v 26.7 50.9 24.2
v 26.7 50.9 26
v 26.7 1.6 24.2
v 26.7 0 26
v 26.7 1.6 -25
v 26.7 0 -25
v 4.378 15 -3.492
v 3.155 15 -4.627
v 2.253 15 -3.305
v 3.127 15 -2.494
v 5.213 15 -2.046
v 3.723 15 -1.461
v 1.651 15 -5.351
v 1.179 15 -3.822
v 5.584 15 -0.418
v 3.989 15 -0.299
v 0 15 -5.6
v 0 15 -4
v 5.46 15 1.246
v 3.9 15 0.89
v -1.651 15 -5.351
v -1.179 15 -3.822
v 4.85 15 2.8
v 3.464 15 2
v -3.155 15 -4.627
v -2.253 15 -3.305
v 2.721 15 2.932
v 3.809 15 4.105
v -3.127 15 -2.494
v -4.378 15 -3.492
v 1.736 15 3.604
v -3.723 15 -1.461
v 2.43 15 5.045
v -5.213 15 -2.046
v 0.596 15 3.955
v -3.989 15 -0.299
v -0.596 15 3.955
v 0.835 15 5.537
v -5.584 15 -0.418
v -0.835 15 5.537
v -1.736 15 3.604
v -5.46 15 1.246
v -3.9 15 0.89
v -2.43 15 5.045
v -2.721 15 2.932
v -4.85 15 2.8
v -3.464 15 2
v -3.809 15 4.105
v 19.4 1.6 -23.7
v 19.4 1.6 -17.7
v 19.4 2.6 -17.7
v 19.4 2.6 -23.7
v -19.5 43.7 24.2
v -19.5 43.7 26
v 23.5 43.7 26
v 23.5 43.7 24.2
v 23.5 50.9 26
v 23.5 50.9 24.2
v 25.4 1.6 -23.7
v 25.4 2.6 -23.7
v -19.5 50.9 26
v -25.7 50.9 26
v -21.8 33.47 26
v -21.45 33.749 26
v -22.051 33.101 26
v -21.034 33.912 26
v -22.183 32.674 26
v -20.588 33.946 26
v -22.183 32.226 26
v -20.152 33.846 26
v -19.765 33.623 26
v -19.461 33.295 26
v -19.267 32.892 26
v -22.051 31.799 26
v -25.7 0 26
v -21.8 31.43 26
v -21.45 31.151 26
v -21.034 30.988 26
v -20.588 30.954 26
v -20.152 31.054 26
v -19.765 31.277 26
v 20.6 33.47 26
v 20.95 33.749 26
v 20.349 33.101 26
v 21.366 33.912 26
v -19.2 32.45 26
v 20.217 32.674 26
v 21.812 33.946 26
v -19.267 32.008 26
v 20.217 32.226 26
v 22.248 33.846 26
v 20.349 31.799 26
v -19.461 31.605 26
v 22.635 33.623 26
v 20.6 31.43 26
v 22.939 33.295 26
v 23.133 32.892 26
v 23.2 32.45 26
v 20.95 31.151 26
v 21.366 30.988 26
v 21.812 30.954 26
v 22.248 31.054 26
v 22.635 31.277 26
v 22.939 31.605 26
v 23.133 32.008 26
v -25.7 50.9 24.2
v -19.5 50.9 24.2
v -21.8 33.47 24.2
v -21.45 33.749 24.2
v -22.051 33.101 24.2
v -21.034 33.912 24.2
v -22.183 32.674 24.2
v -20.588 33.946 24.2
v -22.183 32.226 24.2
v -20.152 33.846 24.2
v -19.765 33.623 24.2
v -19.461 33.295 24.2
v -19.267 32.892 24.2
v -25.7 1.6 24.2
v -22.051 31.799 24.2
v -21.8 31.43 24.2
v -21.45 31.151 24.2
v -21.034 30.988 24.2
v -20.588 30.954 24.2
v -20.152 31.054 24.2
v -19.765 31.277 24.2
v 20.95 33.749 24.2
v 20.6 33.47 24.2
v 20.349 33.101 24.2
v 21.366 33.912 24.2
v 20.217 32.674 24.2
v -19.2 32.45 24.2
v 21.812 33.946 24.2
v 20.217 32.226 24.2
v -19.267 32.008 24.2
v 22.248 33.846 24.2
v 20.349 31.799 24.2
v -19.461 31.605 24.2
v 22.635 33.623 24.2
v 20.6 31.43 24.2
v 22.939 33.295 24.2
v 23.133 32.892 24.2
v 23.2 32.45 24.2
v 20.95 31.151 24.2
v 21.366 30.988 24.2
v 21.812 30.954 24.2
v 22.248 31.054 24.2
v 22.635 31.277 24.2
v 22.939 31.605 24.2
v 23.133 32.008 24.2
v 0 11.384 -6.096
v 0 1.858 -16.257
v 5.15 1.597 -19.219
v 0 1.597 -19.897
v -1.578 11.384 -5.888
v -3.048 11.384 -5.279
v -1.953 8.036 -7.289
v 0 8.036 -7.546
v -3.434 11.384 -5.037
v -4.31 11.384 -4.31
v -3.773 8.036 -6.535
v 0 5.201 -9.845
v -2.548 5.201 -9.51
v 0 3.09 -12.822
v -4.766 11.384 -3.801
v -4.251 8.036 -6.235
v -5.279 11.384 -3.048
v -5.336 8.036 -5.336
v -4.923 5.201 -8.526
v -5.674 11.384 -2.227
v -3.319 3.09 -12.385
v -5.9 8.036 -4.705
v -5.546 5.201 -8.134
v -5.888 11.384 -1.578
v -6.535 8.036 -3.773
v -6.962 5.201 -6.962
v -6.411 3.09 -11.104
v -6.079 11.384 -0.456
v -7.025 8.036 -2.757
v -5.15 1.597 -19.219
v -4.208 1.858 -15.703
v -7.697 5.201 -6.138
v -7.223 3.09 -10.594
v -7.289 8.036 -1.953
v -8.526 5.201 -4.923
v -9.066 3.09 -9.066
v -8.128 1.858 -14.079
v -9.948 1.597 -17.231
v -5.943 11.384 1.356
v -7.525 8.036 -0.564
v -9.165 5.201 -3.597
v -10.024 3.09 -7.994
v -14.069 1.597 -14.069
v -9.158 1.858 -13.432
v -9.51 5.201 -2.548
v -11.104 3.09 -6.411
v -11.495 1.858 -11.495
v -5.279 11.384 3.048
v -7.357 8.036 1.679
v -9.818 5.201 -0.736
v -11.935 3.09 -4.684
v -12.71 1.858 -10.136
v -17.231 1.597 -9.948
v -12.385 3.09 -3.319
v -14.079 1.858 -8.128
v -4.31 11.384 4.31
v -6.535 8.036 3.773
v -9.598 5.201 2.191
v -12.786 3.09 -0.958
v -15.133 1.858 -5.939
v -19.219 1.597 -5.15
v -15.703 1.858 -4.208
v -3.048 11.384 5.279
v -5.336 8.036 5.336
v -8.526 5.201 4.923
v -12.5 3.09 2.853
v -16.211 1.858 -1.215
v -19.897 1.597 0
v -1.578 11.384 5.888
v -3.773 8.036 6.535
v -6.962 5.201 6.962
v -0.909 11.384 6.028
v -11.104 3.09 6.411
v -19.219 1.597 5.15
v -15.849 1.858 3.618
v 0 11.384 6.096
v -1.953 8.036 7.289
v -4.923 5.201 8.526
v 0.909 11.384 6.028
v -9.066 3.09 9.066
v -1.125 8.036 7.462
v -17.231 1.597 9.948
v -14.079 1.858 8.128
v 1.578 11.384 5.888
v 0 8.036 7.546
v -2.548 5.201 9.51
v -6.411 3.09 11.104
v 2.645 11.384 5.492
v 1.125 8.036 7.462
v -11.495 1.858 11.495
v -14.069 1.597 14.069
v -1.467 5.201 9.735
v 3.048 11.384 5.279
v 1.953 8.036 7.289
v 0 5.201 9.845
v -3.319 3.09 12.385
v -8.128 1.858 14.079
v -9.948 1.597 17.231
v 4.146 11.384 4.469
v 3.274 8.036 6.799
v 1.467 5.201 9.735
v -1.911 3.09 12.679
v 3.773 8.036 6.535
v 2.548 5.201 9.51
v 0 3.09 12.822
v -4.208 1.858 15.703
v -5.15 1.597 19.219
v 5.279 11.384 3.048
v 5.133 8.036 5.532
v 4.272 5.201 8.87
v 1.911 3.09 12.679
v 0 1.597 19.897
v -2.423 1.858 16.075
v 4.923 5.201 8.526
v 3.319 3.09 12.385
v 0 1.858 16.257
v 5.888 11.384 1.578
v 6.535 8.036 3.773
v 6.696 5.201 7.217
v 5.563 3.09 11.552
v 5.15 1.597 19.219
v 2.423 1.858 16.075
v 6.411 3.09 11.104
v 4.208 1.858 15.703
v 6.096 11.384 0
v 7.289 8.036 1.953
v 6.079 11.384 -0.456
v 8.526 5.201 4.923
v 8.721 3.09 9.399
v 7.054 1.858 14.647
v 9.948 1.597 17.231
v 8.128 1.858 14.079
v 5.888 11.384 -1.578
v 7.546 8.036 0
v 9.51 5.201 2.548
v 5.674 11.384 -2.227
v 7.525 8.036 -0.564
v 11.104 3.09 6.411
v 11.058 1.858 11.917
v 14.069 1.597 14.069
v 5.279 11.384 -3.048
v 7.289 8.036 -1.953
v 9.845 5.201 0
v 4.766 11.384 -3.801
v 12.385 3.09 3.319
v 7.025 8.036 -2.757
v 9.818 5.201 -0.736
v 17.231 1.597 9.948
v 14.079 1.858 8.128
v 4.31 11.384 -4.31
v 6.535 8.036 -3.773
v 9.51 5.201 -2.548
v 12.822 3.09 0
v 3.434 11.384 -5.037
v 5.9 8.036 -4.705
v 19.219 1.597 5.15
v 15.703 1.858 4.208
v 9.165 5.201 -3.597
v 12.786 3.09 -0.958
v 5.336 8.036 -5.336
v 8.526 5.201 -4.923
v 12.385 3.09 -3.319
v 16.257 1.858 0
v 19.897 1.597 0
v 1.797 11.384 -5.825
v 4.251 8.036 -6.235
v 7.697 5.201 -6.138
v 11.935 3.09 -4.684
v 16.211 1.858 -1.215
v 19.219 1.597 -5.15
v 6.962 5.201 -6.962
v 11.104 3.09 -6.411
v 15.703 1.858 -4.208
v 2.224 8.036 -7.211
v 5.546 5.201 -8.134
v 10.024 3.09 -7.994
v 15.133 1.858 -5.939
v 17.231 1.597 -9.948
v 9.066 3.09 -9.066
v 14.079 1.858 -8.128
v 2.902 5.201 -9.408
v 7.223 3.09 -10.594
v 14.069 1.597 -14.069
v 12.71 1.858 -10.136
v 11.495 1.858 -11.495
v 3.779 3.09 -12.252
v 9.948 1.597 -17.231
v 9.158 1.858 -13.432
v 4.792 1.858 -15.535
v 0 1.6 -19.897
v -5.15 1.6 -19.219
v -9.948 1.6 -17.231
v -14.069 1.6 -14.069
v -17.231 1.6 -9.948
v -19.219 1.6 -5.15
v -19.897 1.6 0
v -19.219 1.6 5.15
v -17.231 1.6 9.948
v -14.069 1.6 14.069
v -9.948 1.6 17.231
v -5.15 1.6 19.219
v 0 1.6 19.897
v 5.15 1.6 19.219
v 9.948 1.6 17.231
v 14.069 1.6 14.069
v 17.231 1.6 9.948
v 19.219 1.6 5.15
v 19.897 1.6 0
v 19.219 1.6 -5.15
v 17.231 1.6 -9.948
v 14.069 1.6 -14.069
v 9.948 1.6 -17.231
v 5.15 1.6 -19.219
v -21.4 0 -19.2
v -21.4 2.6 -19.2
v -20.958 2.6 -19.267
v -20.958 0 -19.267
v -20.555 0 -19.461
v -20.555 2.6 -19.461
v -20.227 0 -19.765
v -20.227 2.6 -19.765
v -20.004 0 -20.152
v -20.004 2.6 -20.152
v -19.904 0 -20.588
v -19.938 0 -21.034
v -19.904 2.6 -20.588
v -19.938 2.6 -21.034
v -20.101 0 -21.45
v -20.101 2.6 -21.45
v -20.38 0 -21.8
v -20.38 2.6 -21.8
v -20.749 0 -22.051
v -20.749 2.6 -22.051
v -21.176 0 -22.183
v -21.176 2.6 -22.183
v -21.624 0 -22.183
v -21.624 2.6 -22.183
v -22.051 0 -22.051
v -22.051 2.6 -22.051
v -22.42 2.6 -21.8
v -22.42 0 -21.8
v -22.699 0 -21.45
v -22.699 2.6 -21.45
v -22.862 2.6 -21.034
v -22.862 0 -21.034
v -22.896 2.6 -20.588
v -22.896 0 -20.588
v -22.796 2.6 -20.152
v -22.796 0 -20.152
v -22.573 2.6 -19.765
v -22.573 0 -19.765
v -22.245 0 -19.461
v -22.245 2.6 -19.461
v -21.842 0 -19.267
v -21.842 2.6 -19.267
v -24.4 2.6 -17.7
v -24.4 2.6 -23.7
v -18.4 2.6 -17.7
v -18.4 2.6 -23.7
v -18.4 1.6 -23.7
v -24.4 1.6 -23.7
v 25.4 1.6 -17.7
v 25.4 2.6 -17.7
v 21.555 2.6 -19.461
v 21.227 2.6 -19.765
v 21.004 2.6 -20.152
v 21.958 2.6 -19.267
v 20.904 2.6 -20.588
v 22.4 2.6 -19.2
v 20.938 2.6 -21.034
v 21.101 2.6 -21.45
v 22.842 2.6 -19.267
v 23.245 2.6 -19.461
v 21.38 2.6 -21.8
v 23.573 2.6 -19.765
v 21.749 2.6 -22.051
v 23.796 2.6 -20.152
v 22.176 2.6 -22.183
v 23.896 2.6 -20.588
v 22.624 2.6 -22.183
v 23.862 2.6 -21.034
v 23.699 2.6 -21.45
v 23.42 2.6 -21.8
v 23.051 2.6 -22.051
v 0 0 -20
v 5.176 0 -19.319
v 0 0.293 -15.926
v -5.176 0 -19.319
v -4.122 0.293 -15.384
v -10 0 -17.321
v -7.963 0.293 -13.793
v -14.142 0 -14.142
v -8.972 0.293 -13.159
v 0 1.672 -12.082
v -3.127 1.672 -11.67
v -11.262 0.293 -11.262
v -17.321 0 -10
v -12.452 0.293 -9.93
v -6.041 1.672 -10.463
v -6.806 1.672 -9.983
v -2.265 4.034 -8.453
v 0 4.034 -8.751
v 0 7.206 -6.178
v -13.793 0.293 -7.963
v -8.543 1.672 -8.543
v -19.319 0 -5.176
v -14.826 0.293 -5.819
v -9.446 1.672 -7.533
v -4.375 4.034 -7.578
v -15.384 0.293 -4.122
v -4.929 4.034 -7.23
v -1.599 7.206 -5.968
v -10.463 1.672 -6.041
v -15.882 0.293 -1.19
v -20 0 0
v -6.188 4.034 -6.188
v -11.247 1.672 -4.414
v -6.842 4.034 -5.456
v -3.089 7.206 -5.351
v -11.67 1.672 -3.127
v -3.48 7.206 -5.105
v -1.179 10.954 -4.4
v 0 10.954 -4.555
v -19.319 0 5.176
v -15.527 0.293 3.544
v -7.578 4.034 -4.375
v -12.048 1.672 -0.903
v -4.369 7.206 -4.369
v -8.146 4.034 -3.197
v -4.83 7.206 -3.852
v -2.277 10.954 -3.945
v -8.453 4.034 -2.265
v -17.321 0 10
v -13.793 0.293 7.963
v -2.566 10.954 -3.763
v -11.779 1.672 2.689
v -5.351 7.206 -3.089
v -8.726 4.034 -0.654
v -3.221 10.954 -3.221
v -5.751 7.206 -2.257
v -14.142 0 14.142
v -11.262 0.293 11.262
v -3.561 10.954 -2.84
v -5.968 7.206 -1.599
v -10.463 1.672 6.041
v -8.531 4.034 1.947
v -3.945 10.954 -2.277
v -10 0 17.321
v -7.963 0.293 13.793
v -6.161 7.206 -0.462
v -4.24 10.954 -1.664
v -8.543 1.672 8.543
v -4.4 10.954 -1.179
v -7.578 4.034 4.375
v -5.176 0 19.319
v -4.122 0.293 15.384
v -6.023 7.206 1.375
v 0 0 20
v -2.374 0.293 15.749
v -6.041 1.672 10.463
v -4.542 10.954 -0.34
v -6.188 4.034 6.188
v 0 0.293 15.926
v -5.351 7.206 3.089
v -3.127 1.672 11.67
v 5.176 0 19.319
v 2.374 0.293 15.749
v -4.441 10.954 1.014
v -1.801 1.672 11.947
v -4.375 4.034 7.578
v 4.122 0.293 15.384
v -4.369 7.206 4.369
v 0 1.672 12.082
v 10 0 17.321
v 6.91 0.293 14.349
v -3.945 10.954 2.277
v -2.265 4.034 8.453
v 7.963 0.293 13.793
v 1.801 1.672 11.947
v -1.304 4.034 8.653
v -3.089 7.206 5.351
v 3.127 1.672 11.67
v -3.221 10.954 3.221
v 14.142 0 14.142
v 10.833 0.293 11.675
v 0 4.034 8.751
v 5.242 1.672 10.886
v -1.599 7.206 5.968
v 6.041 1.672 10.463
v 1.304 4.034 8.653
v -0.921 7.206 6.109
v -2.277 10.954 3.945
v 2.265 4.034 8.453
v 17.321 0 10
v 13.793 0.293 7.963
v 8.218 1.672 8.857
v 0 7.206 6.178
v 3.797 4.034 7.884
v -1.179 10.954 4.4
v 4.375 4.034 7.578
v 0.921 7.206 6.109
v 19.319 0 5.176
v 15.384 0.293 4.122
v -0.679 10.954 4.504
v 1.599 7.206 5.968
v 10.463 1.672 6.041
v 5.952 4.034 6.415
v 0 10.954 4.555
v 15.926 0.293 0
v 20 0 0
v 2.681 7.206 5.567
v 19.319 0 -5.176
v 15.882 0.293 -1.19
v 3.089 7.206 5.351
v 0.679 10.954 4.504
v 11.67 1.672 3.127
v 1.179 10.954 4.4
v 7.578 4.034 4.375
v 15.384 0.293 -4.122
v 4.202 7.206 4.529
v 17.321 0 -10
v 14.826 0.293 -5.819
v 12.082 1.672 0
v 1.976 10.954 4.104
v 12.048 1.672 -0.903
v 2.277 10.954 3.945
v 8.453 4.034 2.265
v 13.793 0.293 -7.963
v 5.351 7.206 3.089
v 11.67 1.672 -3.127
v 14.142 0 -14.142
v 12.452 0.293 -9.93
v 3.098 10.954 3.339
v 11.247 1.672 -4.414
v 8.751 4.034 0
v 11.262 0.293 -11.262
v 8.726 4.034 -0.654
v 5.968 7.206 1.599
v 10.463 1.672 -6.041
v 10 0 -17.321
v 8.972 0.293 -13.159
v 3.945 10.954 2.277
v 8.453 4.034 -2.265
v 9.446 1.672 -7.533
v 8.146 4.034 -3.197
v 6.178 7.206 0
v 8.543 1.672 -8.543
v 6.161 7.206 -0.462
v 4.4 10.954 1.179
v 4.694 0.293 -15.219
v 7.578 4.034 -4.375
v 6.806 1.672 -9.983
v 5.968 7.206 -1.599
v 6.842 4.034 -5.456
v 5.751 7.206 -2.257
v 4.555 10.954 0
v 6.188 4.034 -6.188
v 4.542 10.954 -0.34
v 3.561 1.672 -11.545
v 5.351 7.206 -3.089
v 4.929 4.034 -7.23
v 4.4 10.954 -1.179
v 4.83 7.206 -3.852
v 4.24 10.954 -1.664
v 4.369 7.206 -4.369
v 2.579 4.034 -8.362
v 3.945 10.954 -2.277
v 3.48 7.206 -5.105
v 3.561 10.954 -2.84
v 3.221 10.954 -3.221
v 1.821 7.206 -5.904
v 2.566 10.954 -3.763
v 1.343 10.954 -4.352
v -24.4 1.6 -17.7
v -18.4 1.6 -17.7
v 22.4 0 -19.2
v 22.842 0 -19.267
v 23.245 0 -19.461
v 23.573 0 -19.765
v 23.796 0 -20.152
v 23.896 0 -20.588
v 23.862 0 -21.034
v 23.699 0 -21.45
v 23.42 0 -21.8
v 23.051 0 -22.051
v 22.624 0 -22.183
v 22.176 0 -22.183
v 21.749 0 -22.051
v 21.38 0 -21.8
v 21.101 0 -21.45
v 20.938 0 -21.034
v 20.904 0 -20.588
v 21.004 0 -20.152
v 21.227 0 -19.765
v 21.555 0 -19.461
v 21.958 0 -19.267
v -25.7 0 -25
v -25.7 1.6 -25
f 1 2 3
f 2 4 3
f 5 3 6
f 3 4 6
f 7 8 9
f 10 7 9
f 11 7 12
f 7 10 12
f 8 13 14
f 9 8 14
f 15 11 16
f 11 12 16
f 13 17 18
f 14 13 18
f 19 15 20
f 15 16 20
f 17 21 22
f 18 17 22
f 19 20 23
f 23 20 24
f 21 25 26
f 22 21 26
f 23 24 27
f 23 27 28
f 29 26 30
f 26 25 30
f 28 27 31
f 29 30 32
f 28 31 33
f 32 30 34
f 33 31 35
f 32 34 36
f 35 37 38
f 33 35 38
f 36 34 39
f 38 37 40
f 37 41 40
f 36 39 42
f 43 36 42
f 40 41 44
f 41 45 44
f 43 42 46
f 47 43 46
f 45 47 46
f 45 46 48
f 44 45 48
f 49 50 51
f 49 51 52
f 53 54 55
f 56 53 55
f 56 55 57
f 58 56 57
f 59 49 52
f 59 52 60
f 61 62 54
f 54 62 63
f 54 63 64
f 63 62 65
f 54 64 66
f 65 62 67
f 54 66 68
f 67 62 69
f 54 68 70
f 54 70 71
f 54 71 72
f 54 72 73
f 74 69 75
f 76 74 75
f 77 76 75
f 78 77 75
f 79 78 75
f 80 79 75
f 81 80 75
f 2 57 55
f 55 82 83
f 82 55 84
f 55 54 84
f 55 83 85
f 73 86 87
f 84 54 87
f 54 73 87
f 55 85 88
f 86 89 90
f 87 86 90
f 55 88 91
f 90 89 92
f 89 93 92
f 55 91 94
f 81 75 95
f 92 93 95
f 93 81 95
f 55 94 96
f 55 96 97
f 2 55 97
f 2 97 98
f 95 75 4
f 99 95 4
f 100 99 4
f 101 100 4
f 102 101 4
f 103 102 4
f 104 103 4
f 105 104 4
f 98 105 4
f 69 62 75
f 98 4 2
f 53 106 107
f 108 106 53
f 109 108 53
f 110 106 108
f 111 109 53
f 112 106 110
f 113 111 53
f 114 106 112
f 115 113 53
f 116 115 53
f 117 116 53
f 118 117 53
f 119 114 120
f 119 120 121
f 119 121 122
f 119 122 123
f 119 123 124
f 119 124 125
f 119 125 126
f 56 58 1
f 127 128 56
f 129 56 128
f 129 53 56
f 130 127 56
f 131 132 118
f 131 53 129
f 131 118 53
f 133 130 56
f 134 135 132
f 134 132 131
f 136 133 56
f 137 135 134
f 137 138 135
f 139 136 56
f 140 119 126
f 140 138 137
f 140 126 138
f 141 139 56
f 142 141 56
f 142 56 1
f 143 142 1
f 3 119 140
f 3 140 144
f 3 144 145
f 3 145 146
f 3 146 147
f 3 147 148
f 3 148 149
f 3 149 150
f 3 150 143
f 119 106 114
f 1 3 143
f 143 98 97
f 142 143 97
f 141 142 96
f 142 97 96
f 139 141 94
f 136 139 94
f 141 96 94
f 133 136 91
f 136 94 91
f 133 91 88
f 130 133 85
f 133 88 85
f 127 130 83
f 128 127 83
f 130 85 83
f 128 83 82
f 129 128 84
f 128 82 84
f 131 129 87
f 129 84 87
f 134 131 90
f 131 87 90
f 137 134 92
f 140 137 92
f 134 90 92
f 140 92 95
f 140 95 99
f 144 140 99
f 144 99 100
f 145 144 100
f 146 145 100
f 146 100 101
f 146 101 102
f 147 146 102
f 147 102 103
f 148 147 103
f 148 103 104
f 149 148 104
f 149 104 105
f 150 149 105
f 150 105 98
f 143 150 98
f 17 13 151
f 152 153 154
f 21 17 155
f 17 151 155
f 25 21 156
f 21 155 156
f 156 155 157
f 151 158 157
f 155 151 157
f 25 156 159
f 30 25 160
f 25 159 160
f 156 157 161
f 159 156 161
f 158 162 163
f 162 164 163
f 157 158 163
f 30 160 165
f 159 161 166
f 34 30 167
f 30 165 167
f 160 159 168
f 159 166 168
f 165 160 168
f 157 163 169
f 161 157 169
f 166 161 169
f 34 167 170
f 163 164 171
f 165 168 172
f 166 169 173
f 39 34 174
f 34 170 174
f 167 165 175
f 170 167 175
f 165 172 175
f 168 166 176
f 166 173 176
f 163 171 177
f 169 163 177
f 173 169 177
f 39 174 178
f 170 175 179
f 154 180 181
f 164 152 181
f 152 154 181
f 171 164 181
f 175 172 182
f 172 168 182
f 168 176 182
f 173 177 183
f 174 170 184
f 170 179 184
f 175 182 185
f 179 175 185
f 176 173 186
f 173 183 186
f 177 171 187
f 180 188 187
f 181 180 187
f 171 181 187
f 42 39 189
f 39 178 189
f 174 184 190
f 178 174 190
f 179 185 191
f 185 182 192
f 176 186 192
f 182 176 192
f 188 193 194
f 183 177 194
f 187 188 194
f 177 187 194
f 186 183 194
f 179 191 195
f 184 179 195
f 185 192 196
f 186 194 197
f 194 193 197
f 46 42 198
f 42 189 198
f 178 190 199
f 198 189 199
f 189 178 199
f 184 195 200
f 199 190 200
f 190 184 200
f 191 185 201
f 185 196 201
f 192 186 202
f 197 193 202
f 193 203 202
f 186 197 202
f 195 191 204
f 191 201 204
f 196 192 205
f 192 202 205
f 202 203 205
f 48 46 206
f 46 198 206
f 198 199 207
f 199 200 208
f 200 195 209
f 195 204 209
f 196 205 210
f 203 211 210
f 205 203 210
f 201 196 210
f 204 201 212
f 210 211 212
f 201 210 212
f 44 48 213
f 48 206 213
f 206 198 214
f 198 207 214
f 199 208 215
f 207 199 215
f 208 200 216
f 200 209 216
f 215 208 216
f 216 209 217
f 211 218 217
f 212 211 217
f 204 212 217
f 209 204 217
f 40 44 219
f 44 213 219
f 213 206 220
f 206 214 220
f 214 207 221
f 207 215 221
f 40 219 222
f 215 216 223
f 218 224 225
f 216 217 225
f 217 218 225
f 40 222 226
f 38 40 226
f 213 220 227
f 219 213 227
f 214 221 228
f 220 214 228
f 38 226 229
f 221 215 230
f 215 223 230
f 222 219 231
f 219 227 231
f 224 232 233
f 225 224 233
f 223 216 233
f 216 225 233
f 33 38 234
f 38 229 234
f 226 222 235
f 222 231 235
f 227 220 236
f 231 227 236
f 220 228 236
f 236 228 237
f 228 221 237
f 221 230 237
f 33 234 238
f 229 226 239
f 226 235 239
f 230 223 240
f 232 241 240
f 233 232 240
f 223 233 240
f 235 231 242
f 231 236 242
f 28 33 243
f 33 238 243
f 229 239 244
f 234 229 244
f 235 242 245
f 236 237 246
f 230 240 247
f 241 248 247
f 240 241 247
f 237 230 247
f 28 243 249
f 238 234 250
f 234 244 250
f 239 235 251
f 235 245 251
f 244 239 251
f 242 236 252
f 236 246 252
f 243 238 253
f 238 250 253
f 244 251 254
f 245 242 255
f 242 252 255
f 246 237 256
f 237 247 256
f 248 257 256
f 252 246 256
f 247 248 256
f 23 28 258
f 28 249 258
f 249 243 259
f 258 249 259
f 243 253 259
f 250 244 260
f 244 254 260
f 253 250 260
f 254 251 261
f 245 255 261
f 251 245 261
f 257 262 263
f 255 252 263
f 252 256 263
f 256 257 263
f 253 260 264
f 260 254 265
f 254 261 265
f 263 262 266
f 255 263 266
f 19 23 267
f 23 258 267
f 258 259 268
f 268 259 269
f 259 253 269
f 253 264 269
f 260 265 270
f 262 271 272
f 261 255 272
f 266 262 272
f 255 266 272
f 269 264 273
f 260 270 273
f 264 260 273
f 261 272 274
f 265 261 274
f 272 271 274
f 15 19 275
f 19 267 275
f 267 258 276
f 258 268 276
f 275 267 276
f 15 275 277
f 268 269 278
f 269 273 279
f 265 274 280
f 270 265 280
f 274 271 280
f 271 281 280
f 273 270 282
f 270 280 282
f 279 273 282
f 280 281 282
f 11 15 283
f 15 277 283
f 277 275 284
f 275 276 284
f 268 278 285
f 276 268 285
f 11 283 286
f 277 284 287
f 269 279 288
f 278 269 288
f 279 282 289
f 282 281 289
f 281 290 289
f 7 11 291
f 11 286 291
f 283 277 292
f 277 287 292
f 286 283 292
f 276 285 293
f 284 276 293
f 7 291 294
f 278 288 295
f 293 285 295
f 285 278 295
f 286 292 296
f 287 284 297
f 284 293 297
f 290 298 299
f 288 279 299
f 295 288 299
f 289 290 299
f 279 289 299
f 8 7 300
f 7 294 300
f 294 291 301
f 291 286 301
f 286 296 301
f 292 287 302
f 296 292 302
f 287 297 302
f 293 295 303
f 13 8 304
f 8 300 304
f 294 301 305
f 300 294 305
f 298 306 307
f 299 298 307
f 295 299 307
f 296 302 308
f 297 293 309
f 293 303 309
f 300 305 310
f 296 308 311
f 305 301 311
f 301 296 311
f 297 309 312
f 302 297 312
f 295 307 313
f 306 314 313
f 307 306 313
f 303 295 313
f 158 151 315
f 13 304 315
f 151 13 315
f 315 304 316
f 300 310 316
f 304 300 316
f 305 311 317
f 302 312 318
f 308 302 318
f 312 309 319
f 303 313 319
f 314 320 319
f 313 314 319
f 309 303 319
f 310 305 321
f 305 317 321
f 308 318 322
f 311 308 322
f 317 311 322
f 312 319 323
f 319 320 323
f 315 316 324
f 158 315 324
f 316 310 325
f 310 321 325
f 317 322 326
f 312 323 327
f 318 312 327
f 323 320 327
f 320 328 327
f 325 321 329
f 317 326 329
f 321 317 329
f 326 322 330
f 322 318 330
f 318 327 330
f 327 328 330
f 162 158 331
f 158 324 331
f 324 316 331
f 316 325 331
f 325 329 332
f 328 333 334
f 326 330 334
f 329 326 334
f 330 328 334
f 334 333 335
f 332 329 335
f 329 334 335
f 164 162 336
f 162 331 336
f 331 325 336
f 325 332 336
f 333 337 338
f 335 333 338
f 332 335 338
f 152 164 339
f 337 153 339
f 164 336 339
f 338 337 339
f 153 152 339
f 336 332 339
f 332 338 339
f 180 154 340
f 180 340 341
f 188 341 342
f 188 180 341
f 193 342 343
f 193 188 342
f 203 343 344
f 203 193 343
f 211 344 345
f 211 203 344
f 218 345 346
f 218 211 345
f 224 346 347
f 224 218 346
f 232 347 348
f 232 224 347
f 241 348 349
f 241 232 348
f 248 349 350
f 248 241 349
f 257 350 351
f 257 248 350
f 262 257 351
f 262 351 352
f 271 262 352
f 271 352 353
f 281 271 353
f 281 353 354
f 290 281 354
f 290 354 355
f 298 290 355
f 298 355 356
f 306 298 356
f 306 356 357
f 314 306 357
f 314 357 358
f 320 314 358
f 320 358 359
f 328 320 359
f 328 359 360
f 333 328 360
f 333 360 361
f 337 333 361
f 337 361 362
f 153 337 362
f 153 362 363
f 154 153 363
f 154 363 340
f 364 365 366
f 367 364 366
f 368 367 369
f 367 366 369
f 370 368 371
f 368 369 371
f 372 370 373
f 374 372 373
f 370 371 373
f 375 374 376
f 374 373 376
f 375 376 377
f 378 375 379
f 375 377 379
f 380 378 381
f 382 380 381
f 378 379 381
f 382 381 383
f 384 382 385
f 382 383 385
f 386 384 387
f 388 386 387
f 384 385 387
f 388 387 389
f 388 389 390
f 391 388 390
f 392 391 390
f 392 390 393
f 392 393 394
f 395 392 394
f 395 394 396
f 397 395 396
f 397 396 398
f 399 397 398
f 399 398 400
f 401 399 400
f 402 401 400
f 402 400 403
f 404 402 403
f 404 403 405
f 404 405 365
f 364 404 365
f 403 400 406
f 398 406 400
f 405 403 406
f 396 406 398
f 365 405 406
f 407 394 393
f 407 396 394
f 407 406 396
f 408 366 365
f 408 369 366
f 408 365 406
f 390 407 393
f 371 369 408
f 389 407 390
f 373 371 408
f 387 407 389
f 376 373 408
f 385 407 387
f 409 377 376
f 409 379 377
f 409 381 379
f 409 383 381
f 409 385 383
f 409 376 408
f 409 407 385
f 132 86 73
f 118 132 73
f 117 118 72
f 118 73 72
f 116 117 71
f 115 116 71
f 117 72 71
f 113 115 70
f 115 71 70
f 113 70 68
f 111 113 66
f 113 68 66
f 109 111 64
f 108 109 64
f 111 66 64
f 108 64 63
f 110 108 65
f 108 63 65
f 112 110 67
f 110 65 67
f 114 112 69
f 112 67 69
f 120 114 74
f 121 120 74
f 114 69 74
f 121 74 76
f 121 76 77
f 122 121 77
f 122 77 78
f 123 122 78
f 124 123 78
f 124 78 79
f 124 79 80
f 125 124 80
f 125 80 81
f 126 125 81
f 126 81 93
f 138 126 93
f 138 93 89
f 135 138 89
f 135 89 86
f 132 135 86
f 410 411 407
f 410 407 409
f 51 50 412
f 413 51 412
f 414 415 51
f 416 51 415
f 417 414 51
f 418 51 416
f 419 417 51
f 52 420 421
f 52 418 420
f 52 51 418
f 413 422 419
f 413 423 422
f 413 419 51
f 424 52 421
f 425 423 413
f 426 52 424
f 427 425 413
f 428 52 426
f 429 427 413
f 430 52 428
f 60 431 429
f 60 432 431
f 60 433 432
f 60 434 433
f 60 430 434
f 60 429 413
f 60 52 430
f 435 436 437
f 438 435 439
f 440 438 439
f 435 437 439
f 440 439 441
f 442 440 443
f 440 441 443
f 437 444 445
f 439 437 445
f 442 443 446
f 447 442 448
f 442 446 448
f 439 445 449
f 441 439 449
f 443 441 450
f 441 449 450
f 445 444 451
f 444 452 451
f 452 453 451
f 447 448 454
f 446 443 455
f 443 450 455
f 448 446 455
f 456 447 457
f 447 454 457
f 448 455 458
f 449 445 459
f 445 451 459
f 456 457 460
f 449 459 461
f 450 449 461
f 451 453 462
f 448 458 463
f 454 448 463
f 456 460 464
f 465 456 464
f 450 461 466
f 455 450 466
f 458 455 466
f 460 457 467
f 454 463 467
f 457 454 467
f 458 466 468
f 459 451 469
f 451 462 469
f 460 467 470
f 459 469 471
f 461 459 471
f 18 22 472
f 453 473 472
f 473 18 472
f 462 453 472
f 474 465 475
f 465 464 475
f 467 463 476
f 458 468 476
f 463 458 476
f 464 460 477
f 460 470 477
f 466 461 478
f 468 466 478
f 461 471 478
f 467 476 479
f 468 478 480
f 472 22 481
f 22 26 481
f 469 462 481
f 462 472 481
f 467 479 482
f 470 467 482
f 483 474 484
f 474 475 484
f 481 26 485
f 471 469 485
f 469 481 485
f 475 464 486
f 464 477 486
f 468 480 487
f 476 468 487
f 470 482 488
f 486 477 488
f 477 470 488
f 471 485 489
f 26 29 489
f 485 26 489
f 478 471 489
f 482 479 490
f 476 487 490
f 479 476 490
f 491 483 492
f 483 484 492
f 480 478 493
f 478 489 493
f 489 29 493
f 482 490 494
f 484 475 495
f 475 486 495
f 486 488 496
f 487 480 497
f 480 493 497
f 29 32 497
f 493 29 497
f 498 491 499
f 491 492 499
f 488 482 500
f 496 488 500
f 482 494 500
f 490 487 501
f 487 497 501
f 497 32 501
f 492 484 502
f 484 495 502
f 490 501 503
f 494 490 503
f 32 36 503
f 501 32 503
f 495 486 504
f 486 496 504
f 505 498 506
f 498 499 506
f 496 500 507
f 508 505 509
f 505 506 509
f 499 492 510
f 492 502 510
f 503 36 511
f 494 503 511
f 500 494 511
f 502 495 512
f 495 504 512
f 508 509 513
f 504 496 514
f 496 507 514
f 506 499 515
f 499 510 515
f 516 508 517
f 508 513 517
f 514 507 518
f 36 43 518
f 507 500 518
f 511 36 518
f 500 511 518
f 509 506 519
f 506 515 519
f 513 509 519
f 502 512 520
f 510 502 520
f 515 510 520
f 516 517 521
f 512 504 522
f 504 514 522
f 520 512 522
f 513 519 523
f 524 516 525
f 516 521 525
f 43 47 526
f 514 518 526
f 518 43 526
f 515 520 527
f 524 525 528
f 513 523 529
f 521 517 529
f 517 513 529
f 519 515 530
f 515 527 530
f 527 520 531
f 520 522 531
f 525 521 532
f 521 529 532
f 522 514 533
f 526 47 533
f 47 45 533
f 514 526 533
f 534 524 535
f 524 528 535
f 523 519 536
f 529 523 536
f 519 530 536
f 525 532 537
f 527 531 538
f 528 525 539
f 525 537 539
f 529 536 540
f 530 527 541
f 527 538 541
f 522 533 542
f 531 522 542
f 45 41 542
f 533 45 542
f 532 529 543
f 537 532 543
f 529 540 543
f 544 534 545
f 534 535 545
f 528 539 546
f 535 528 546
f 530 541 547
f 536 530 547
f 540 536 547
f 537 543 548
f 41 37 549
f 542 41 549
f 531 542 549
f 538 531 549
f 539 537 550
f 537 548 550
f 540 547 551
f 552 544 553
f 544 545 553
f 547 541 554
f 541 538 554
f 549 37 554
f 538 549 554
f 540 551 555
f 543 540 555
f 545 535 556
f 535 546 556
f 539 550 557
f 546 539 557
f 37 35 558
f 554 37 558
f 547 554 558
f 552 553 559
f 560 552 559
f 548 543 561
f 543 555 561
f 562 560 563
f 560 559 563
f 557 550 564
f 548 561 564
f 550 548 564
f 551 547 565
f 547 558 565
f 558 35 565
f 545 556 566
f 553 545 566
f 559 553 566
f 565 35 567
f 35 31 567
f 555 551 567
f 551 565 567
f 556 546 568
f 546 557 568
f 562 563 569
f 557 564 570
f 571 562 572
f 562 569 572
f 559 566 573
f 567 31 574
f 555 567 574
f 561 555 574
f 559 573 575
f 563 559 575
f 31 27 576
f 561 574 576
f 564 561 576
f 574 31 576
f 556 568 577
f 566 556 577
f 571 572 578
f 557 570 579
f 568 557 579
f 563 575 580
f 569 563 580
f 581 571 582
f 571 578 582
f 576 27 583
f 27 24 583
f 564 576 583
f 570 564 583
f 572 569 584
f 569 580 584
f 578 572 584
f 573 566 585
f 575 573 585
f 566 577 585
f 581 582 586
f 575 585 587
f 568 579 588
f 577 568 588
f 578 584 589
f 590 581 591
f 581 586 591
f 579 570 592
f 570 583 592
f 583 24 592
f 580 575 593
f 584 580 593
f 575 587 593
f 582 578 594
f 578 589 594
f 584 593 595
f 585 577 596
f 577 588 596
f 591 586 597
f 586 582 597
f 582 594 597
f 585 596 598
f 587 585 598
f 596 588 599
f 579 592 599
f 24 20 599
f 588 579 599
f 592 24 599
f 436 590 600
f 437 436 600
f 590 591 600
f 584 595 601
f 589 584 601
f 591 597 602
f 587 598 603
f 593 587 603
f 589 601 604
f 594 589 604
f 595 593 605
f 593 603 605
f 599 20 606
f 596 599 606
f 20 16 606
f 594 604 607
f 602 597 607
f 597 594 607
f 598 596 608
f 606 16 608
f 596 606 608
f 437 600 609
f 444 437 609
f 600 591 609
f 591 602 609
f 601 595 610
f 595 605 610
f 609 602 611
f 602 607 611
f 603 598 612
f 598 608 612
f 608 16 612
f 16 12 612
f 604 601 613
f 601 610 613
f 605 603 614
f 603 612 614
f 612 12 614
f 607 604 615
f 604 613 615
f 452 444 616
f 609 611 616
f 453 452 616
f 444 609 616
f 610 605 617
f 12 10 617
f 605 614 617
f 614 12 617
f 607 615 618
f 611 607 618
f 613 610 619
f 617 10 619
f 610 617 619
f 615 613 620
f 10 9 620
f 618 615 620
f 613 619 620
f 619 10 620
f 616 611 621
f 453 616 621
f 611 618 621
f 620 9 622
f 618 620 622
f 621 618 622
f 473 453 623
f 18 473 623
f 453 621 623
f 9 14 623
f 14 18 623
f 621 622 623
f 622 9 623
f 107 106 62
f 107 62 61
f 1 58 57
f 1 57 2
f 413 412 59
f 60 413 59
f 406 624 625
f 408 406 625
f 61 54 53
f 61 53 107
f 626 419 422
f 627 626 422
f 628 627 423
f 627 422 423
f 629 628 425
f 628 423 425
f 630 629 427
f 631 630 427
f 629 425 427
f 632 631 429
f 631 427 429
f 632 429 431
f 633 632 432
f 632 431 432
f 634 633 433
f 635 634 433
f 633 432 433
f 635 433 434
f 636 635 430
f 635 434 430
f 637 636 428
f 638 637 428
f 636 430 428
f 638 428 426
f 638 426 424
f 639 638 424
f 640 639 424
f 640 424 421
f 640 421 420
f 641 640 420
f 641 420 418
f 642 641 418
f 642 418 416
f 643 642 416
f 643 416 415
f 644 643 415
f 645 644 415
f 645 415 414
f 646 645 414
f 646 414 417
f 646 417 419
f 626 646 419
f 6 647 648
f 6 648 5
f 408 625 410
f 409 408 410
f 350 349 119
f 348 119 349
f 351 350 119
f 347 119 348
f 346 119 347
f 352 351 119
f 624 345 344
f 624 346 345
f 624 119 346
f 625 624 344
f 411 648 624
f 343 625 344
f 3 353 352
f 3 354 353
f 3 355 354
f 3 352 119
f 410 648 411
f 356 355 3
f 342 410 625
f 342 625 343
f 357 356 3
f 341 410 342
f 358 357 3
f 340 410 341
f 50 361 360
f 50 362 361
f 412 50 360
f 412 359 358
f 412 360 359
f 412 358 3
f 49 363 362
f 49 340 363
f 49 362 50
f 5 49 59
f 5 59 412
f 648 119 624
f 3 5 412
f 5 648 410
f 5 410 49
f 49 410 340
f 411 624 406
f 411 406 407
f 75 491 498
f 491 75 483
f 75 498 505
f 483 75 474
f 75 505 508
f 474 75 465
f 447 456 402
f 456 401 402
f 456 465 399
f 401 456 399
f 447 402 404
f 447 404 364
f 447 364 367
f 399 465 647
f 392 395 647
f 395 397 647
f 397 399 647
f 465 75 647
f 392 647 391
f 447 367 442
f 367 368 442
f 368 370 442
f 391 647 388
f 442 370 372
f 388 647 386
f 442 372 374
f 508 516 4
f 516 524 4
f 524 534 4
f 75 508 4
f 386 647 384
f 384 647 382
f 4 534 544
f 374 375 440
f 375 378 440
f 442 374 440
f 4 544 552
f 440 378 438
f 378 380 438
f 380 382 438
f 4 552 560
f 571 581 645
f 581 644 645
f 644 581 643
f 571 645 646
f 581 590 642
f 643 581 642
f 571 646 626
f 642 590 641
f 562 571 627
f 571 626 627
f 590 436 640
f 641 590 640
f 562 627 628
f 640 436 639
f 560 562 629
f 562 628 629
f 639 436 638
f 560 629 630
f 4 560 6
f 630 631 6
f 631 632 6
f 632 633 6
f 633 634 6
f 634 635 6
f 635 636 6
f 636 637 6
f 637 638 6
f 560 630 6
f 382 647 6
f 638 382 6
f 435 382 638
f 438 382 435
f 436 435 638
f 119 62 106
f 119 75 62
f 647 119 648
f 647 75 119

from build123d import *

# Parameters (mm, degrees)
SKETCH2_W           = 52.4
SKETCH2_H           = 51
SKETCH2_R           = 19.896881497
BOSS_EXTRUDE1_DEPTH = 1.6
SKETCH3_W           = 52.4
SKETCH3_H           = 1.8
BOSS_EXTRUDE2_DEPTH = 49.3
SKETCH4_W           = 6
SKETCH4_H           = 6
BOSS_EXTRUDE3_DEPTH = 1
SKETCH5_R           = 1.5
CUT_EXTRUDE1_DEPTH  = 62.006393108
SKETCH6_R           = 1.5
SKETCH6_W           = 43
SKETCH6_H           = 7.2
CUT_EXTRUDE2_DEPTH  = 77.842045782


with BuildPart() as part:
    # Sketch1 → Revolve1 (revolve)
    with BuildSketch(Plane.XY, mode=Mode.PRIVATE) as revolve1_sk:
        with BuildLine():
            Line((4, 15), (5.6, 15))
            ThreePointArc((5.6, 15), (9.845065713, 5.201403427), (19.896881497, 1.596673597))
            Line((19.896881497, 1.596673597), (20, 0))
            ThreePointArc((20, 0), (8.750759907, 4.0341439), (4, 15))
        make_face()
    revolve(revolve1_sk.sketch.rotate(Axis((0, 0, 0), (0, 1, 0)), 90), axis=Axis((0, 0, 0), (0, 1, 0)))

    # Sketch2 → Boss-Extrude1 (add)
    with BuildSketch(Plane(origin=(0, 0, 0), x_dir=(1, 0, 0), z_dir=(0, 1, 0))):
        with Locations((0.5, -0.5)):
            Rectangle(SKETCH2_W, SKETCH2_H)
        with Locations(Location((0, 0, 0), (0, 0, 90))):
            Circle(SKETCH2_R, mode=Mode.SUBTRACT)
    extrude(amount=BOSS_EXTRUDE1_DEPTH)

    # Sketch3 → Boss-Extrude2 (add)
    with BuildSketch(Plane(origin=(0, 1.6, 0), x_dir=(1, 0, 0), z_dir=(0, 1, 0))):
        with Locations((0.5, -25.1)):
            Rectangle(SKETCH3_W, SKETCH3_H)
    extrude(amount=BOSS_EXTRUDE2_DEPTH)

    # Sketch4 → Boss-Extrude3 (add)
    with BuildSketch(Plane(origin=(0, 1.6, 0), x_dir=(1, 0, 0), z_dir=(0, 1, 0))):
        with Locations((22.4, 20.7)):
            Rectangle(SKETCH4_W, SKETCH4_H)
        with Locations((-21.4, 20.7)):
            Rectangle(SKETCH4_W, SKETCH4_H)
    extrude(amount=BOSS_EXTRUDE3_DEPTH)

    # Sketch5 → Cut-Extrude1 (cut, through all)
    with BuildSketch(Plane(origin=(0, 2.6, 0), x_dir=(1, 0, 0), z_dir=(0, 1, 0))):
        with Locations(Location((22.4, 20.7, 0), (0, 0, 270))):
            Circle(SKETCH5_R)
        with Locations(Location((-21.4, 20.7, 0), (0, 0, 270))):
            Circle(SKETCH5_R)
    extrude(amount=-CUT_EXTRUDE1_DEPTH, mode=Mode.SUBTRACT)

    # Sketch6 → Cut-Extrude2 (cut, through all)
    with BuildSketch(Plane.XY.offset(26)):
        with Locations((-20.7, 32.45)):
            Circle(SKETCH6_R)
        with Locations((21.7, 32.45)):
            Circle(SKETCH6_R)
        with Locations((2, 47.3)):
            Rectangle(SKETCH6_W, SKETCH6_H)
    extrude(amount=-CUT_EXTRUDE2_DEPTH, mode=Mode.SUBTRACT)


solid = part.part
